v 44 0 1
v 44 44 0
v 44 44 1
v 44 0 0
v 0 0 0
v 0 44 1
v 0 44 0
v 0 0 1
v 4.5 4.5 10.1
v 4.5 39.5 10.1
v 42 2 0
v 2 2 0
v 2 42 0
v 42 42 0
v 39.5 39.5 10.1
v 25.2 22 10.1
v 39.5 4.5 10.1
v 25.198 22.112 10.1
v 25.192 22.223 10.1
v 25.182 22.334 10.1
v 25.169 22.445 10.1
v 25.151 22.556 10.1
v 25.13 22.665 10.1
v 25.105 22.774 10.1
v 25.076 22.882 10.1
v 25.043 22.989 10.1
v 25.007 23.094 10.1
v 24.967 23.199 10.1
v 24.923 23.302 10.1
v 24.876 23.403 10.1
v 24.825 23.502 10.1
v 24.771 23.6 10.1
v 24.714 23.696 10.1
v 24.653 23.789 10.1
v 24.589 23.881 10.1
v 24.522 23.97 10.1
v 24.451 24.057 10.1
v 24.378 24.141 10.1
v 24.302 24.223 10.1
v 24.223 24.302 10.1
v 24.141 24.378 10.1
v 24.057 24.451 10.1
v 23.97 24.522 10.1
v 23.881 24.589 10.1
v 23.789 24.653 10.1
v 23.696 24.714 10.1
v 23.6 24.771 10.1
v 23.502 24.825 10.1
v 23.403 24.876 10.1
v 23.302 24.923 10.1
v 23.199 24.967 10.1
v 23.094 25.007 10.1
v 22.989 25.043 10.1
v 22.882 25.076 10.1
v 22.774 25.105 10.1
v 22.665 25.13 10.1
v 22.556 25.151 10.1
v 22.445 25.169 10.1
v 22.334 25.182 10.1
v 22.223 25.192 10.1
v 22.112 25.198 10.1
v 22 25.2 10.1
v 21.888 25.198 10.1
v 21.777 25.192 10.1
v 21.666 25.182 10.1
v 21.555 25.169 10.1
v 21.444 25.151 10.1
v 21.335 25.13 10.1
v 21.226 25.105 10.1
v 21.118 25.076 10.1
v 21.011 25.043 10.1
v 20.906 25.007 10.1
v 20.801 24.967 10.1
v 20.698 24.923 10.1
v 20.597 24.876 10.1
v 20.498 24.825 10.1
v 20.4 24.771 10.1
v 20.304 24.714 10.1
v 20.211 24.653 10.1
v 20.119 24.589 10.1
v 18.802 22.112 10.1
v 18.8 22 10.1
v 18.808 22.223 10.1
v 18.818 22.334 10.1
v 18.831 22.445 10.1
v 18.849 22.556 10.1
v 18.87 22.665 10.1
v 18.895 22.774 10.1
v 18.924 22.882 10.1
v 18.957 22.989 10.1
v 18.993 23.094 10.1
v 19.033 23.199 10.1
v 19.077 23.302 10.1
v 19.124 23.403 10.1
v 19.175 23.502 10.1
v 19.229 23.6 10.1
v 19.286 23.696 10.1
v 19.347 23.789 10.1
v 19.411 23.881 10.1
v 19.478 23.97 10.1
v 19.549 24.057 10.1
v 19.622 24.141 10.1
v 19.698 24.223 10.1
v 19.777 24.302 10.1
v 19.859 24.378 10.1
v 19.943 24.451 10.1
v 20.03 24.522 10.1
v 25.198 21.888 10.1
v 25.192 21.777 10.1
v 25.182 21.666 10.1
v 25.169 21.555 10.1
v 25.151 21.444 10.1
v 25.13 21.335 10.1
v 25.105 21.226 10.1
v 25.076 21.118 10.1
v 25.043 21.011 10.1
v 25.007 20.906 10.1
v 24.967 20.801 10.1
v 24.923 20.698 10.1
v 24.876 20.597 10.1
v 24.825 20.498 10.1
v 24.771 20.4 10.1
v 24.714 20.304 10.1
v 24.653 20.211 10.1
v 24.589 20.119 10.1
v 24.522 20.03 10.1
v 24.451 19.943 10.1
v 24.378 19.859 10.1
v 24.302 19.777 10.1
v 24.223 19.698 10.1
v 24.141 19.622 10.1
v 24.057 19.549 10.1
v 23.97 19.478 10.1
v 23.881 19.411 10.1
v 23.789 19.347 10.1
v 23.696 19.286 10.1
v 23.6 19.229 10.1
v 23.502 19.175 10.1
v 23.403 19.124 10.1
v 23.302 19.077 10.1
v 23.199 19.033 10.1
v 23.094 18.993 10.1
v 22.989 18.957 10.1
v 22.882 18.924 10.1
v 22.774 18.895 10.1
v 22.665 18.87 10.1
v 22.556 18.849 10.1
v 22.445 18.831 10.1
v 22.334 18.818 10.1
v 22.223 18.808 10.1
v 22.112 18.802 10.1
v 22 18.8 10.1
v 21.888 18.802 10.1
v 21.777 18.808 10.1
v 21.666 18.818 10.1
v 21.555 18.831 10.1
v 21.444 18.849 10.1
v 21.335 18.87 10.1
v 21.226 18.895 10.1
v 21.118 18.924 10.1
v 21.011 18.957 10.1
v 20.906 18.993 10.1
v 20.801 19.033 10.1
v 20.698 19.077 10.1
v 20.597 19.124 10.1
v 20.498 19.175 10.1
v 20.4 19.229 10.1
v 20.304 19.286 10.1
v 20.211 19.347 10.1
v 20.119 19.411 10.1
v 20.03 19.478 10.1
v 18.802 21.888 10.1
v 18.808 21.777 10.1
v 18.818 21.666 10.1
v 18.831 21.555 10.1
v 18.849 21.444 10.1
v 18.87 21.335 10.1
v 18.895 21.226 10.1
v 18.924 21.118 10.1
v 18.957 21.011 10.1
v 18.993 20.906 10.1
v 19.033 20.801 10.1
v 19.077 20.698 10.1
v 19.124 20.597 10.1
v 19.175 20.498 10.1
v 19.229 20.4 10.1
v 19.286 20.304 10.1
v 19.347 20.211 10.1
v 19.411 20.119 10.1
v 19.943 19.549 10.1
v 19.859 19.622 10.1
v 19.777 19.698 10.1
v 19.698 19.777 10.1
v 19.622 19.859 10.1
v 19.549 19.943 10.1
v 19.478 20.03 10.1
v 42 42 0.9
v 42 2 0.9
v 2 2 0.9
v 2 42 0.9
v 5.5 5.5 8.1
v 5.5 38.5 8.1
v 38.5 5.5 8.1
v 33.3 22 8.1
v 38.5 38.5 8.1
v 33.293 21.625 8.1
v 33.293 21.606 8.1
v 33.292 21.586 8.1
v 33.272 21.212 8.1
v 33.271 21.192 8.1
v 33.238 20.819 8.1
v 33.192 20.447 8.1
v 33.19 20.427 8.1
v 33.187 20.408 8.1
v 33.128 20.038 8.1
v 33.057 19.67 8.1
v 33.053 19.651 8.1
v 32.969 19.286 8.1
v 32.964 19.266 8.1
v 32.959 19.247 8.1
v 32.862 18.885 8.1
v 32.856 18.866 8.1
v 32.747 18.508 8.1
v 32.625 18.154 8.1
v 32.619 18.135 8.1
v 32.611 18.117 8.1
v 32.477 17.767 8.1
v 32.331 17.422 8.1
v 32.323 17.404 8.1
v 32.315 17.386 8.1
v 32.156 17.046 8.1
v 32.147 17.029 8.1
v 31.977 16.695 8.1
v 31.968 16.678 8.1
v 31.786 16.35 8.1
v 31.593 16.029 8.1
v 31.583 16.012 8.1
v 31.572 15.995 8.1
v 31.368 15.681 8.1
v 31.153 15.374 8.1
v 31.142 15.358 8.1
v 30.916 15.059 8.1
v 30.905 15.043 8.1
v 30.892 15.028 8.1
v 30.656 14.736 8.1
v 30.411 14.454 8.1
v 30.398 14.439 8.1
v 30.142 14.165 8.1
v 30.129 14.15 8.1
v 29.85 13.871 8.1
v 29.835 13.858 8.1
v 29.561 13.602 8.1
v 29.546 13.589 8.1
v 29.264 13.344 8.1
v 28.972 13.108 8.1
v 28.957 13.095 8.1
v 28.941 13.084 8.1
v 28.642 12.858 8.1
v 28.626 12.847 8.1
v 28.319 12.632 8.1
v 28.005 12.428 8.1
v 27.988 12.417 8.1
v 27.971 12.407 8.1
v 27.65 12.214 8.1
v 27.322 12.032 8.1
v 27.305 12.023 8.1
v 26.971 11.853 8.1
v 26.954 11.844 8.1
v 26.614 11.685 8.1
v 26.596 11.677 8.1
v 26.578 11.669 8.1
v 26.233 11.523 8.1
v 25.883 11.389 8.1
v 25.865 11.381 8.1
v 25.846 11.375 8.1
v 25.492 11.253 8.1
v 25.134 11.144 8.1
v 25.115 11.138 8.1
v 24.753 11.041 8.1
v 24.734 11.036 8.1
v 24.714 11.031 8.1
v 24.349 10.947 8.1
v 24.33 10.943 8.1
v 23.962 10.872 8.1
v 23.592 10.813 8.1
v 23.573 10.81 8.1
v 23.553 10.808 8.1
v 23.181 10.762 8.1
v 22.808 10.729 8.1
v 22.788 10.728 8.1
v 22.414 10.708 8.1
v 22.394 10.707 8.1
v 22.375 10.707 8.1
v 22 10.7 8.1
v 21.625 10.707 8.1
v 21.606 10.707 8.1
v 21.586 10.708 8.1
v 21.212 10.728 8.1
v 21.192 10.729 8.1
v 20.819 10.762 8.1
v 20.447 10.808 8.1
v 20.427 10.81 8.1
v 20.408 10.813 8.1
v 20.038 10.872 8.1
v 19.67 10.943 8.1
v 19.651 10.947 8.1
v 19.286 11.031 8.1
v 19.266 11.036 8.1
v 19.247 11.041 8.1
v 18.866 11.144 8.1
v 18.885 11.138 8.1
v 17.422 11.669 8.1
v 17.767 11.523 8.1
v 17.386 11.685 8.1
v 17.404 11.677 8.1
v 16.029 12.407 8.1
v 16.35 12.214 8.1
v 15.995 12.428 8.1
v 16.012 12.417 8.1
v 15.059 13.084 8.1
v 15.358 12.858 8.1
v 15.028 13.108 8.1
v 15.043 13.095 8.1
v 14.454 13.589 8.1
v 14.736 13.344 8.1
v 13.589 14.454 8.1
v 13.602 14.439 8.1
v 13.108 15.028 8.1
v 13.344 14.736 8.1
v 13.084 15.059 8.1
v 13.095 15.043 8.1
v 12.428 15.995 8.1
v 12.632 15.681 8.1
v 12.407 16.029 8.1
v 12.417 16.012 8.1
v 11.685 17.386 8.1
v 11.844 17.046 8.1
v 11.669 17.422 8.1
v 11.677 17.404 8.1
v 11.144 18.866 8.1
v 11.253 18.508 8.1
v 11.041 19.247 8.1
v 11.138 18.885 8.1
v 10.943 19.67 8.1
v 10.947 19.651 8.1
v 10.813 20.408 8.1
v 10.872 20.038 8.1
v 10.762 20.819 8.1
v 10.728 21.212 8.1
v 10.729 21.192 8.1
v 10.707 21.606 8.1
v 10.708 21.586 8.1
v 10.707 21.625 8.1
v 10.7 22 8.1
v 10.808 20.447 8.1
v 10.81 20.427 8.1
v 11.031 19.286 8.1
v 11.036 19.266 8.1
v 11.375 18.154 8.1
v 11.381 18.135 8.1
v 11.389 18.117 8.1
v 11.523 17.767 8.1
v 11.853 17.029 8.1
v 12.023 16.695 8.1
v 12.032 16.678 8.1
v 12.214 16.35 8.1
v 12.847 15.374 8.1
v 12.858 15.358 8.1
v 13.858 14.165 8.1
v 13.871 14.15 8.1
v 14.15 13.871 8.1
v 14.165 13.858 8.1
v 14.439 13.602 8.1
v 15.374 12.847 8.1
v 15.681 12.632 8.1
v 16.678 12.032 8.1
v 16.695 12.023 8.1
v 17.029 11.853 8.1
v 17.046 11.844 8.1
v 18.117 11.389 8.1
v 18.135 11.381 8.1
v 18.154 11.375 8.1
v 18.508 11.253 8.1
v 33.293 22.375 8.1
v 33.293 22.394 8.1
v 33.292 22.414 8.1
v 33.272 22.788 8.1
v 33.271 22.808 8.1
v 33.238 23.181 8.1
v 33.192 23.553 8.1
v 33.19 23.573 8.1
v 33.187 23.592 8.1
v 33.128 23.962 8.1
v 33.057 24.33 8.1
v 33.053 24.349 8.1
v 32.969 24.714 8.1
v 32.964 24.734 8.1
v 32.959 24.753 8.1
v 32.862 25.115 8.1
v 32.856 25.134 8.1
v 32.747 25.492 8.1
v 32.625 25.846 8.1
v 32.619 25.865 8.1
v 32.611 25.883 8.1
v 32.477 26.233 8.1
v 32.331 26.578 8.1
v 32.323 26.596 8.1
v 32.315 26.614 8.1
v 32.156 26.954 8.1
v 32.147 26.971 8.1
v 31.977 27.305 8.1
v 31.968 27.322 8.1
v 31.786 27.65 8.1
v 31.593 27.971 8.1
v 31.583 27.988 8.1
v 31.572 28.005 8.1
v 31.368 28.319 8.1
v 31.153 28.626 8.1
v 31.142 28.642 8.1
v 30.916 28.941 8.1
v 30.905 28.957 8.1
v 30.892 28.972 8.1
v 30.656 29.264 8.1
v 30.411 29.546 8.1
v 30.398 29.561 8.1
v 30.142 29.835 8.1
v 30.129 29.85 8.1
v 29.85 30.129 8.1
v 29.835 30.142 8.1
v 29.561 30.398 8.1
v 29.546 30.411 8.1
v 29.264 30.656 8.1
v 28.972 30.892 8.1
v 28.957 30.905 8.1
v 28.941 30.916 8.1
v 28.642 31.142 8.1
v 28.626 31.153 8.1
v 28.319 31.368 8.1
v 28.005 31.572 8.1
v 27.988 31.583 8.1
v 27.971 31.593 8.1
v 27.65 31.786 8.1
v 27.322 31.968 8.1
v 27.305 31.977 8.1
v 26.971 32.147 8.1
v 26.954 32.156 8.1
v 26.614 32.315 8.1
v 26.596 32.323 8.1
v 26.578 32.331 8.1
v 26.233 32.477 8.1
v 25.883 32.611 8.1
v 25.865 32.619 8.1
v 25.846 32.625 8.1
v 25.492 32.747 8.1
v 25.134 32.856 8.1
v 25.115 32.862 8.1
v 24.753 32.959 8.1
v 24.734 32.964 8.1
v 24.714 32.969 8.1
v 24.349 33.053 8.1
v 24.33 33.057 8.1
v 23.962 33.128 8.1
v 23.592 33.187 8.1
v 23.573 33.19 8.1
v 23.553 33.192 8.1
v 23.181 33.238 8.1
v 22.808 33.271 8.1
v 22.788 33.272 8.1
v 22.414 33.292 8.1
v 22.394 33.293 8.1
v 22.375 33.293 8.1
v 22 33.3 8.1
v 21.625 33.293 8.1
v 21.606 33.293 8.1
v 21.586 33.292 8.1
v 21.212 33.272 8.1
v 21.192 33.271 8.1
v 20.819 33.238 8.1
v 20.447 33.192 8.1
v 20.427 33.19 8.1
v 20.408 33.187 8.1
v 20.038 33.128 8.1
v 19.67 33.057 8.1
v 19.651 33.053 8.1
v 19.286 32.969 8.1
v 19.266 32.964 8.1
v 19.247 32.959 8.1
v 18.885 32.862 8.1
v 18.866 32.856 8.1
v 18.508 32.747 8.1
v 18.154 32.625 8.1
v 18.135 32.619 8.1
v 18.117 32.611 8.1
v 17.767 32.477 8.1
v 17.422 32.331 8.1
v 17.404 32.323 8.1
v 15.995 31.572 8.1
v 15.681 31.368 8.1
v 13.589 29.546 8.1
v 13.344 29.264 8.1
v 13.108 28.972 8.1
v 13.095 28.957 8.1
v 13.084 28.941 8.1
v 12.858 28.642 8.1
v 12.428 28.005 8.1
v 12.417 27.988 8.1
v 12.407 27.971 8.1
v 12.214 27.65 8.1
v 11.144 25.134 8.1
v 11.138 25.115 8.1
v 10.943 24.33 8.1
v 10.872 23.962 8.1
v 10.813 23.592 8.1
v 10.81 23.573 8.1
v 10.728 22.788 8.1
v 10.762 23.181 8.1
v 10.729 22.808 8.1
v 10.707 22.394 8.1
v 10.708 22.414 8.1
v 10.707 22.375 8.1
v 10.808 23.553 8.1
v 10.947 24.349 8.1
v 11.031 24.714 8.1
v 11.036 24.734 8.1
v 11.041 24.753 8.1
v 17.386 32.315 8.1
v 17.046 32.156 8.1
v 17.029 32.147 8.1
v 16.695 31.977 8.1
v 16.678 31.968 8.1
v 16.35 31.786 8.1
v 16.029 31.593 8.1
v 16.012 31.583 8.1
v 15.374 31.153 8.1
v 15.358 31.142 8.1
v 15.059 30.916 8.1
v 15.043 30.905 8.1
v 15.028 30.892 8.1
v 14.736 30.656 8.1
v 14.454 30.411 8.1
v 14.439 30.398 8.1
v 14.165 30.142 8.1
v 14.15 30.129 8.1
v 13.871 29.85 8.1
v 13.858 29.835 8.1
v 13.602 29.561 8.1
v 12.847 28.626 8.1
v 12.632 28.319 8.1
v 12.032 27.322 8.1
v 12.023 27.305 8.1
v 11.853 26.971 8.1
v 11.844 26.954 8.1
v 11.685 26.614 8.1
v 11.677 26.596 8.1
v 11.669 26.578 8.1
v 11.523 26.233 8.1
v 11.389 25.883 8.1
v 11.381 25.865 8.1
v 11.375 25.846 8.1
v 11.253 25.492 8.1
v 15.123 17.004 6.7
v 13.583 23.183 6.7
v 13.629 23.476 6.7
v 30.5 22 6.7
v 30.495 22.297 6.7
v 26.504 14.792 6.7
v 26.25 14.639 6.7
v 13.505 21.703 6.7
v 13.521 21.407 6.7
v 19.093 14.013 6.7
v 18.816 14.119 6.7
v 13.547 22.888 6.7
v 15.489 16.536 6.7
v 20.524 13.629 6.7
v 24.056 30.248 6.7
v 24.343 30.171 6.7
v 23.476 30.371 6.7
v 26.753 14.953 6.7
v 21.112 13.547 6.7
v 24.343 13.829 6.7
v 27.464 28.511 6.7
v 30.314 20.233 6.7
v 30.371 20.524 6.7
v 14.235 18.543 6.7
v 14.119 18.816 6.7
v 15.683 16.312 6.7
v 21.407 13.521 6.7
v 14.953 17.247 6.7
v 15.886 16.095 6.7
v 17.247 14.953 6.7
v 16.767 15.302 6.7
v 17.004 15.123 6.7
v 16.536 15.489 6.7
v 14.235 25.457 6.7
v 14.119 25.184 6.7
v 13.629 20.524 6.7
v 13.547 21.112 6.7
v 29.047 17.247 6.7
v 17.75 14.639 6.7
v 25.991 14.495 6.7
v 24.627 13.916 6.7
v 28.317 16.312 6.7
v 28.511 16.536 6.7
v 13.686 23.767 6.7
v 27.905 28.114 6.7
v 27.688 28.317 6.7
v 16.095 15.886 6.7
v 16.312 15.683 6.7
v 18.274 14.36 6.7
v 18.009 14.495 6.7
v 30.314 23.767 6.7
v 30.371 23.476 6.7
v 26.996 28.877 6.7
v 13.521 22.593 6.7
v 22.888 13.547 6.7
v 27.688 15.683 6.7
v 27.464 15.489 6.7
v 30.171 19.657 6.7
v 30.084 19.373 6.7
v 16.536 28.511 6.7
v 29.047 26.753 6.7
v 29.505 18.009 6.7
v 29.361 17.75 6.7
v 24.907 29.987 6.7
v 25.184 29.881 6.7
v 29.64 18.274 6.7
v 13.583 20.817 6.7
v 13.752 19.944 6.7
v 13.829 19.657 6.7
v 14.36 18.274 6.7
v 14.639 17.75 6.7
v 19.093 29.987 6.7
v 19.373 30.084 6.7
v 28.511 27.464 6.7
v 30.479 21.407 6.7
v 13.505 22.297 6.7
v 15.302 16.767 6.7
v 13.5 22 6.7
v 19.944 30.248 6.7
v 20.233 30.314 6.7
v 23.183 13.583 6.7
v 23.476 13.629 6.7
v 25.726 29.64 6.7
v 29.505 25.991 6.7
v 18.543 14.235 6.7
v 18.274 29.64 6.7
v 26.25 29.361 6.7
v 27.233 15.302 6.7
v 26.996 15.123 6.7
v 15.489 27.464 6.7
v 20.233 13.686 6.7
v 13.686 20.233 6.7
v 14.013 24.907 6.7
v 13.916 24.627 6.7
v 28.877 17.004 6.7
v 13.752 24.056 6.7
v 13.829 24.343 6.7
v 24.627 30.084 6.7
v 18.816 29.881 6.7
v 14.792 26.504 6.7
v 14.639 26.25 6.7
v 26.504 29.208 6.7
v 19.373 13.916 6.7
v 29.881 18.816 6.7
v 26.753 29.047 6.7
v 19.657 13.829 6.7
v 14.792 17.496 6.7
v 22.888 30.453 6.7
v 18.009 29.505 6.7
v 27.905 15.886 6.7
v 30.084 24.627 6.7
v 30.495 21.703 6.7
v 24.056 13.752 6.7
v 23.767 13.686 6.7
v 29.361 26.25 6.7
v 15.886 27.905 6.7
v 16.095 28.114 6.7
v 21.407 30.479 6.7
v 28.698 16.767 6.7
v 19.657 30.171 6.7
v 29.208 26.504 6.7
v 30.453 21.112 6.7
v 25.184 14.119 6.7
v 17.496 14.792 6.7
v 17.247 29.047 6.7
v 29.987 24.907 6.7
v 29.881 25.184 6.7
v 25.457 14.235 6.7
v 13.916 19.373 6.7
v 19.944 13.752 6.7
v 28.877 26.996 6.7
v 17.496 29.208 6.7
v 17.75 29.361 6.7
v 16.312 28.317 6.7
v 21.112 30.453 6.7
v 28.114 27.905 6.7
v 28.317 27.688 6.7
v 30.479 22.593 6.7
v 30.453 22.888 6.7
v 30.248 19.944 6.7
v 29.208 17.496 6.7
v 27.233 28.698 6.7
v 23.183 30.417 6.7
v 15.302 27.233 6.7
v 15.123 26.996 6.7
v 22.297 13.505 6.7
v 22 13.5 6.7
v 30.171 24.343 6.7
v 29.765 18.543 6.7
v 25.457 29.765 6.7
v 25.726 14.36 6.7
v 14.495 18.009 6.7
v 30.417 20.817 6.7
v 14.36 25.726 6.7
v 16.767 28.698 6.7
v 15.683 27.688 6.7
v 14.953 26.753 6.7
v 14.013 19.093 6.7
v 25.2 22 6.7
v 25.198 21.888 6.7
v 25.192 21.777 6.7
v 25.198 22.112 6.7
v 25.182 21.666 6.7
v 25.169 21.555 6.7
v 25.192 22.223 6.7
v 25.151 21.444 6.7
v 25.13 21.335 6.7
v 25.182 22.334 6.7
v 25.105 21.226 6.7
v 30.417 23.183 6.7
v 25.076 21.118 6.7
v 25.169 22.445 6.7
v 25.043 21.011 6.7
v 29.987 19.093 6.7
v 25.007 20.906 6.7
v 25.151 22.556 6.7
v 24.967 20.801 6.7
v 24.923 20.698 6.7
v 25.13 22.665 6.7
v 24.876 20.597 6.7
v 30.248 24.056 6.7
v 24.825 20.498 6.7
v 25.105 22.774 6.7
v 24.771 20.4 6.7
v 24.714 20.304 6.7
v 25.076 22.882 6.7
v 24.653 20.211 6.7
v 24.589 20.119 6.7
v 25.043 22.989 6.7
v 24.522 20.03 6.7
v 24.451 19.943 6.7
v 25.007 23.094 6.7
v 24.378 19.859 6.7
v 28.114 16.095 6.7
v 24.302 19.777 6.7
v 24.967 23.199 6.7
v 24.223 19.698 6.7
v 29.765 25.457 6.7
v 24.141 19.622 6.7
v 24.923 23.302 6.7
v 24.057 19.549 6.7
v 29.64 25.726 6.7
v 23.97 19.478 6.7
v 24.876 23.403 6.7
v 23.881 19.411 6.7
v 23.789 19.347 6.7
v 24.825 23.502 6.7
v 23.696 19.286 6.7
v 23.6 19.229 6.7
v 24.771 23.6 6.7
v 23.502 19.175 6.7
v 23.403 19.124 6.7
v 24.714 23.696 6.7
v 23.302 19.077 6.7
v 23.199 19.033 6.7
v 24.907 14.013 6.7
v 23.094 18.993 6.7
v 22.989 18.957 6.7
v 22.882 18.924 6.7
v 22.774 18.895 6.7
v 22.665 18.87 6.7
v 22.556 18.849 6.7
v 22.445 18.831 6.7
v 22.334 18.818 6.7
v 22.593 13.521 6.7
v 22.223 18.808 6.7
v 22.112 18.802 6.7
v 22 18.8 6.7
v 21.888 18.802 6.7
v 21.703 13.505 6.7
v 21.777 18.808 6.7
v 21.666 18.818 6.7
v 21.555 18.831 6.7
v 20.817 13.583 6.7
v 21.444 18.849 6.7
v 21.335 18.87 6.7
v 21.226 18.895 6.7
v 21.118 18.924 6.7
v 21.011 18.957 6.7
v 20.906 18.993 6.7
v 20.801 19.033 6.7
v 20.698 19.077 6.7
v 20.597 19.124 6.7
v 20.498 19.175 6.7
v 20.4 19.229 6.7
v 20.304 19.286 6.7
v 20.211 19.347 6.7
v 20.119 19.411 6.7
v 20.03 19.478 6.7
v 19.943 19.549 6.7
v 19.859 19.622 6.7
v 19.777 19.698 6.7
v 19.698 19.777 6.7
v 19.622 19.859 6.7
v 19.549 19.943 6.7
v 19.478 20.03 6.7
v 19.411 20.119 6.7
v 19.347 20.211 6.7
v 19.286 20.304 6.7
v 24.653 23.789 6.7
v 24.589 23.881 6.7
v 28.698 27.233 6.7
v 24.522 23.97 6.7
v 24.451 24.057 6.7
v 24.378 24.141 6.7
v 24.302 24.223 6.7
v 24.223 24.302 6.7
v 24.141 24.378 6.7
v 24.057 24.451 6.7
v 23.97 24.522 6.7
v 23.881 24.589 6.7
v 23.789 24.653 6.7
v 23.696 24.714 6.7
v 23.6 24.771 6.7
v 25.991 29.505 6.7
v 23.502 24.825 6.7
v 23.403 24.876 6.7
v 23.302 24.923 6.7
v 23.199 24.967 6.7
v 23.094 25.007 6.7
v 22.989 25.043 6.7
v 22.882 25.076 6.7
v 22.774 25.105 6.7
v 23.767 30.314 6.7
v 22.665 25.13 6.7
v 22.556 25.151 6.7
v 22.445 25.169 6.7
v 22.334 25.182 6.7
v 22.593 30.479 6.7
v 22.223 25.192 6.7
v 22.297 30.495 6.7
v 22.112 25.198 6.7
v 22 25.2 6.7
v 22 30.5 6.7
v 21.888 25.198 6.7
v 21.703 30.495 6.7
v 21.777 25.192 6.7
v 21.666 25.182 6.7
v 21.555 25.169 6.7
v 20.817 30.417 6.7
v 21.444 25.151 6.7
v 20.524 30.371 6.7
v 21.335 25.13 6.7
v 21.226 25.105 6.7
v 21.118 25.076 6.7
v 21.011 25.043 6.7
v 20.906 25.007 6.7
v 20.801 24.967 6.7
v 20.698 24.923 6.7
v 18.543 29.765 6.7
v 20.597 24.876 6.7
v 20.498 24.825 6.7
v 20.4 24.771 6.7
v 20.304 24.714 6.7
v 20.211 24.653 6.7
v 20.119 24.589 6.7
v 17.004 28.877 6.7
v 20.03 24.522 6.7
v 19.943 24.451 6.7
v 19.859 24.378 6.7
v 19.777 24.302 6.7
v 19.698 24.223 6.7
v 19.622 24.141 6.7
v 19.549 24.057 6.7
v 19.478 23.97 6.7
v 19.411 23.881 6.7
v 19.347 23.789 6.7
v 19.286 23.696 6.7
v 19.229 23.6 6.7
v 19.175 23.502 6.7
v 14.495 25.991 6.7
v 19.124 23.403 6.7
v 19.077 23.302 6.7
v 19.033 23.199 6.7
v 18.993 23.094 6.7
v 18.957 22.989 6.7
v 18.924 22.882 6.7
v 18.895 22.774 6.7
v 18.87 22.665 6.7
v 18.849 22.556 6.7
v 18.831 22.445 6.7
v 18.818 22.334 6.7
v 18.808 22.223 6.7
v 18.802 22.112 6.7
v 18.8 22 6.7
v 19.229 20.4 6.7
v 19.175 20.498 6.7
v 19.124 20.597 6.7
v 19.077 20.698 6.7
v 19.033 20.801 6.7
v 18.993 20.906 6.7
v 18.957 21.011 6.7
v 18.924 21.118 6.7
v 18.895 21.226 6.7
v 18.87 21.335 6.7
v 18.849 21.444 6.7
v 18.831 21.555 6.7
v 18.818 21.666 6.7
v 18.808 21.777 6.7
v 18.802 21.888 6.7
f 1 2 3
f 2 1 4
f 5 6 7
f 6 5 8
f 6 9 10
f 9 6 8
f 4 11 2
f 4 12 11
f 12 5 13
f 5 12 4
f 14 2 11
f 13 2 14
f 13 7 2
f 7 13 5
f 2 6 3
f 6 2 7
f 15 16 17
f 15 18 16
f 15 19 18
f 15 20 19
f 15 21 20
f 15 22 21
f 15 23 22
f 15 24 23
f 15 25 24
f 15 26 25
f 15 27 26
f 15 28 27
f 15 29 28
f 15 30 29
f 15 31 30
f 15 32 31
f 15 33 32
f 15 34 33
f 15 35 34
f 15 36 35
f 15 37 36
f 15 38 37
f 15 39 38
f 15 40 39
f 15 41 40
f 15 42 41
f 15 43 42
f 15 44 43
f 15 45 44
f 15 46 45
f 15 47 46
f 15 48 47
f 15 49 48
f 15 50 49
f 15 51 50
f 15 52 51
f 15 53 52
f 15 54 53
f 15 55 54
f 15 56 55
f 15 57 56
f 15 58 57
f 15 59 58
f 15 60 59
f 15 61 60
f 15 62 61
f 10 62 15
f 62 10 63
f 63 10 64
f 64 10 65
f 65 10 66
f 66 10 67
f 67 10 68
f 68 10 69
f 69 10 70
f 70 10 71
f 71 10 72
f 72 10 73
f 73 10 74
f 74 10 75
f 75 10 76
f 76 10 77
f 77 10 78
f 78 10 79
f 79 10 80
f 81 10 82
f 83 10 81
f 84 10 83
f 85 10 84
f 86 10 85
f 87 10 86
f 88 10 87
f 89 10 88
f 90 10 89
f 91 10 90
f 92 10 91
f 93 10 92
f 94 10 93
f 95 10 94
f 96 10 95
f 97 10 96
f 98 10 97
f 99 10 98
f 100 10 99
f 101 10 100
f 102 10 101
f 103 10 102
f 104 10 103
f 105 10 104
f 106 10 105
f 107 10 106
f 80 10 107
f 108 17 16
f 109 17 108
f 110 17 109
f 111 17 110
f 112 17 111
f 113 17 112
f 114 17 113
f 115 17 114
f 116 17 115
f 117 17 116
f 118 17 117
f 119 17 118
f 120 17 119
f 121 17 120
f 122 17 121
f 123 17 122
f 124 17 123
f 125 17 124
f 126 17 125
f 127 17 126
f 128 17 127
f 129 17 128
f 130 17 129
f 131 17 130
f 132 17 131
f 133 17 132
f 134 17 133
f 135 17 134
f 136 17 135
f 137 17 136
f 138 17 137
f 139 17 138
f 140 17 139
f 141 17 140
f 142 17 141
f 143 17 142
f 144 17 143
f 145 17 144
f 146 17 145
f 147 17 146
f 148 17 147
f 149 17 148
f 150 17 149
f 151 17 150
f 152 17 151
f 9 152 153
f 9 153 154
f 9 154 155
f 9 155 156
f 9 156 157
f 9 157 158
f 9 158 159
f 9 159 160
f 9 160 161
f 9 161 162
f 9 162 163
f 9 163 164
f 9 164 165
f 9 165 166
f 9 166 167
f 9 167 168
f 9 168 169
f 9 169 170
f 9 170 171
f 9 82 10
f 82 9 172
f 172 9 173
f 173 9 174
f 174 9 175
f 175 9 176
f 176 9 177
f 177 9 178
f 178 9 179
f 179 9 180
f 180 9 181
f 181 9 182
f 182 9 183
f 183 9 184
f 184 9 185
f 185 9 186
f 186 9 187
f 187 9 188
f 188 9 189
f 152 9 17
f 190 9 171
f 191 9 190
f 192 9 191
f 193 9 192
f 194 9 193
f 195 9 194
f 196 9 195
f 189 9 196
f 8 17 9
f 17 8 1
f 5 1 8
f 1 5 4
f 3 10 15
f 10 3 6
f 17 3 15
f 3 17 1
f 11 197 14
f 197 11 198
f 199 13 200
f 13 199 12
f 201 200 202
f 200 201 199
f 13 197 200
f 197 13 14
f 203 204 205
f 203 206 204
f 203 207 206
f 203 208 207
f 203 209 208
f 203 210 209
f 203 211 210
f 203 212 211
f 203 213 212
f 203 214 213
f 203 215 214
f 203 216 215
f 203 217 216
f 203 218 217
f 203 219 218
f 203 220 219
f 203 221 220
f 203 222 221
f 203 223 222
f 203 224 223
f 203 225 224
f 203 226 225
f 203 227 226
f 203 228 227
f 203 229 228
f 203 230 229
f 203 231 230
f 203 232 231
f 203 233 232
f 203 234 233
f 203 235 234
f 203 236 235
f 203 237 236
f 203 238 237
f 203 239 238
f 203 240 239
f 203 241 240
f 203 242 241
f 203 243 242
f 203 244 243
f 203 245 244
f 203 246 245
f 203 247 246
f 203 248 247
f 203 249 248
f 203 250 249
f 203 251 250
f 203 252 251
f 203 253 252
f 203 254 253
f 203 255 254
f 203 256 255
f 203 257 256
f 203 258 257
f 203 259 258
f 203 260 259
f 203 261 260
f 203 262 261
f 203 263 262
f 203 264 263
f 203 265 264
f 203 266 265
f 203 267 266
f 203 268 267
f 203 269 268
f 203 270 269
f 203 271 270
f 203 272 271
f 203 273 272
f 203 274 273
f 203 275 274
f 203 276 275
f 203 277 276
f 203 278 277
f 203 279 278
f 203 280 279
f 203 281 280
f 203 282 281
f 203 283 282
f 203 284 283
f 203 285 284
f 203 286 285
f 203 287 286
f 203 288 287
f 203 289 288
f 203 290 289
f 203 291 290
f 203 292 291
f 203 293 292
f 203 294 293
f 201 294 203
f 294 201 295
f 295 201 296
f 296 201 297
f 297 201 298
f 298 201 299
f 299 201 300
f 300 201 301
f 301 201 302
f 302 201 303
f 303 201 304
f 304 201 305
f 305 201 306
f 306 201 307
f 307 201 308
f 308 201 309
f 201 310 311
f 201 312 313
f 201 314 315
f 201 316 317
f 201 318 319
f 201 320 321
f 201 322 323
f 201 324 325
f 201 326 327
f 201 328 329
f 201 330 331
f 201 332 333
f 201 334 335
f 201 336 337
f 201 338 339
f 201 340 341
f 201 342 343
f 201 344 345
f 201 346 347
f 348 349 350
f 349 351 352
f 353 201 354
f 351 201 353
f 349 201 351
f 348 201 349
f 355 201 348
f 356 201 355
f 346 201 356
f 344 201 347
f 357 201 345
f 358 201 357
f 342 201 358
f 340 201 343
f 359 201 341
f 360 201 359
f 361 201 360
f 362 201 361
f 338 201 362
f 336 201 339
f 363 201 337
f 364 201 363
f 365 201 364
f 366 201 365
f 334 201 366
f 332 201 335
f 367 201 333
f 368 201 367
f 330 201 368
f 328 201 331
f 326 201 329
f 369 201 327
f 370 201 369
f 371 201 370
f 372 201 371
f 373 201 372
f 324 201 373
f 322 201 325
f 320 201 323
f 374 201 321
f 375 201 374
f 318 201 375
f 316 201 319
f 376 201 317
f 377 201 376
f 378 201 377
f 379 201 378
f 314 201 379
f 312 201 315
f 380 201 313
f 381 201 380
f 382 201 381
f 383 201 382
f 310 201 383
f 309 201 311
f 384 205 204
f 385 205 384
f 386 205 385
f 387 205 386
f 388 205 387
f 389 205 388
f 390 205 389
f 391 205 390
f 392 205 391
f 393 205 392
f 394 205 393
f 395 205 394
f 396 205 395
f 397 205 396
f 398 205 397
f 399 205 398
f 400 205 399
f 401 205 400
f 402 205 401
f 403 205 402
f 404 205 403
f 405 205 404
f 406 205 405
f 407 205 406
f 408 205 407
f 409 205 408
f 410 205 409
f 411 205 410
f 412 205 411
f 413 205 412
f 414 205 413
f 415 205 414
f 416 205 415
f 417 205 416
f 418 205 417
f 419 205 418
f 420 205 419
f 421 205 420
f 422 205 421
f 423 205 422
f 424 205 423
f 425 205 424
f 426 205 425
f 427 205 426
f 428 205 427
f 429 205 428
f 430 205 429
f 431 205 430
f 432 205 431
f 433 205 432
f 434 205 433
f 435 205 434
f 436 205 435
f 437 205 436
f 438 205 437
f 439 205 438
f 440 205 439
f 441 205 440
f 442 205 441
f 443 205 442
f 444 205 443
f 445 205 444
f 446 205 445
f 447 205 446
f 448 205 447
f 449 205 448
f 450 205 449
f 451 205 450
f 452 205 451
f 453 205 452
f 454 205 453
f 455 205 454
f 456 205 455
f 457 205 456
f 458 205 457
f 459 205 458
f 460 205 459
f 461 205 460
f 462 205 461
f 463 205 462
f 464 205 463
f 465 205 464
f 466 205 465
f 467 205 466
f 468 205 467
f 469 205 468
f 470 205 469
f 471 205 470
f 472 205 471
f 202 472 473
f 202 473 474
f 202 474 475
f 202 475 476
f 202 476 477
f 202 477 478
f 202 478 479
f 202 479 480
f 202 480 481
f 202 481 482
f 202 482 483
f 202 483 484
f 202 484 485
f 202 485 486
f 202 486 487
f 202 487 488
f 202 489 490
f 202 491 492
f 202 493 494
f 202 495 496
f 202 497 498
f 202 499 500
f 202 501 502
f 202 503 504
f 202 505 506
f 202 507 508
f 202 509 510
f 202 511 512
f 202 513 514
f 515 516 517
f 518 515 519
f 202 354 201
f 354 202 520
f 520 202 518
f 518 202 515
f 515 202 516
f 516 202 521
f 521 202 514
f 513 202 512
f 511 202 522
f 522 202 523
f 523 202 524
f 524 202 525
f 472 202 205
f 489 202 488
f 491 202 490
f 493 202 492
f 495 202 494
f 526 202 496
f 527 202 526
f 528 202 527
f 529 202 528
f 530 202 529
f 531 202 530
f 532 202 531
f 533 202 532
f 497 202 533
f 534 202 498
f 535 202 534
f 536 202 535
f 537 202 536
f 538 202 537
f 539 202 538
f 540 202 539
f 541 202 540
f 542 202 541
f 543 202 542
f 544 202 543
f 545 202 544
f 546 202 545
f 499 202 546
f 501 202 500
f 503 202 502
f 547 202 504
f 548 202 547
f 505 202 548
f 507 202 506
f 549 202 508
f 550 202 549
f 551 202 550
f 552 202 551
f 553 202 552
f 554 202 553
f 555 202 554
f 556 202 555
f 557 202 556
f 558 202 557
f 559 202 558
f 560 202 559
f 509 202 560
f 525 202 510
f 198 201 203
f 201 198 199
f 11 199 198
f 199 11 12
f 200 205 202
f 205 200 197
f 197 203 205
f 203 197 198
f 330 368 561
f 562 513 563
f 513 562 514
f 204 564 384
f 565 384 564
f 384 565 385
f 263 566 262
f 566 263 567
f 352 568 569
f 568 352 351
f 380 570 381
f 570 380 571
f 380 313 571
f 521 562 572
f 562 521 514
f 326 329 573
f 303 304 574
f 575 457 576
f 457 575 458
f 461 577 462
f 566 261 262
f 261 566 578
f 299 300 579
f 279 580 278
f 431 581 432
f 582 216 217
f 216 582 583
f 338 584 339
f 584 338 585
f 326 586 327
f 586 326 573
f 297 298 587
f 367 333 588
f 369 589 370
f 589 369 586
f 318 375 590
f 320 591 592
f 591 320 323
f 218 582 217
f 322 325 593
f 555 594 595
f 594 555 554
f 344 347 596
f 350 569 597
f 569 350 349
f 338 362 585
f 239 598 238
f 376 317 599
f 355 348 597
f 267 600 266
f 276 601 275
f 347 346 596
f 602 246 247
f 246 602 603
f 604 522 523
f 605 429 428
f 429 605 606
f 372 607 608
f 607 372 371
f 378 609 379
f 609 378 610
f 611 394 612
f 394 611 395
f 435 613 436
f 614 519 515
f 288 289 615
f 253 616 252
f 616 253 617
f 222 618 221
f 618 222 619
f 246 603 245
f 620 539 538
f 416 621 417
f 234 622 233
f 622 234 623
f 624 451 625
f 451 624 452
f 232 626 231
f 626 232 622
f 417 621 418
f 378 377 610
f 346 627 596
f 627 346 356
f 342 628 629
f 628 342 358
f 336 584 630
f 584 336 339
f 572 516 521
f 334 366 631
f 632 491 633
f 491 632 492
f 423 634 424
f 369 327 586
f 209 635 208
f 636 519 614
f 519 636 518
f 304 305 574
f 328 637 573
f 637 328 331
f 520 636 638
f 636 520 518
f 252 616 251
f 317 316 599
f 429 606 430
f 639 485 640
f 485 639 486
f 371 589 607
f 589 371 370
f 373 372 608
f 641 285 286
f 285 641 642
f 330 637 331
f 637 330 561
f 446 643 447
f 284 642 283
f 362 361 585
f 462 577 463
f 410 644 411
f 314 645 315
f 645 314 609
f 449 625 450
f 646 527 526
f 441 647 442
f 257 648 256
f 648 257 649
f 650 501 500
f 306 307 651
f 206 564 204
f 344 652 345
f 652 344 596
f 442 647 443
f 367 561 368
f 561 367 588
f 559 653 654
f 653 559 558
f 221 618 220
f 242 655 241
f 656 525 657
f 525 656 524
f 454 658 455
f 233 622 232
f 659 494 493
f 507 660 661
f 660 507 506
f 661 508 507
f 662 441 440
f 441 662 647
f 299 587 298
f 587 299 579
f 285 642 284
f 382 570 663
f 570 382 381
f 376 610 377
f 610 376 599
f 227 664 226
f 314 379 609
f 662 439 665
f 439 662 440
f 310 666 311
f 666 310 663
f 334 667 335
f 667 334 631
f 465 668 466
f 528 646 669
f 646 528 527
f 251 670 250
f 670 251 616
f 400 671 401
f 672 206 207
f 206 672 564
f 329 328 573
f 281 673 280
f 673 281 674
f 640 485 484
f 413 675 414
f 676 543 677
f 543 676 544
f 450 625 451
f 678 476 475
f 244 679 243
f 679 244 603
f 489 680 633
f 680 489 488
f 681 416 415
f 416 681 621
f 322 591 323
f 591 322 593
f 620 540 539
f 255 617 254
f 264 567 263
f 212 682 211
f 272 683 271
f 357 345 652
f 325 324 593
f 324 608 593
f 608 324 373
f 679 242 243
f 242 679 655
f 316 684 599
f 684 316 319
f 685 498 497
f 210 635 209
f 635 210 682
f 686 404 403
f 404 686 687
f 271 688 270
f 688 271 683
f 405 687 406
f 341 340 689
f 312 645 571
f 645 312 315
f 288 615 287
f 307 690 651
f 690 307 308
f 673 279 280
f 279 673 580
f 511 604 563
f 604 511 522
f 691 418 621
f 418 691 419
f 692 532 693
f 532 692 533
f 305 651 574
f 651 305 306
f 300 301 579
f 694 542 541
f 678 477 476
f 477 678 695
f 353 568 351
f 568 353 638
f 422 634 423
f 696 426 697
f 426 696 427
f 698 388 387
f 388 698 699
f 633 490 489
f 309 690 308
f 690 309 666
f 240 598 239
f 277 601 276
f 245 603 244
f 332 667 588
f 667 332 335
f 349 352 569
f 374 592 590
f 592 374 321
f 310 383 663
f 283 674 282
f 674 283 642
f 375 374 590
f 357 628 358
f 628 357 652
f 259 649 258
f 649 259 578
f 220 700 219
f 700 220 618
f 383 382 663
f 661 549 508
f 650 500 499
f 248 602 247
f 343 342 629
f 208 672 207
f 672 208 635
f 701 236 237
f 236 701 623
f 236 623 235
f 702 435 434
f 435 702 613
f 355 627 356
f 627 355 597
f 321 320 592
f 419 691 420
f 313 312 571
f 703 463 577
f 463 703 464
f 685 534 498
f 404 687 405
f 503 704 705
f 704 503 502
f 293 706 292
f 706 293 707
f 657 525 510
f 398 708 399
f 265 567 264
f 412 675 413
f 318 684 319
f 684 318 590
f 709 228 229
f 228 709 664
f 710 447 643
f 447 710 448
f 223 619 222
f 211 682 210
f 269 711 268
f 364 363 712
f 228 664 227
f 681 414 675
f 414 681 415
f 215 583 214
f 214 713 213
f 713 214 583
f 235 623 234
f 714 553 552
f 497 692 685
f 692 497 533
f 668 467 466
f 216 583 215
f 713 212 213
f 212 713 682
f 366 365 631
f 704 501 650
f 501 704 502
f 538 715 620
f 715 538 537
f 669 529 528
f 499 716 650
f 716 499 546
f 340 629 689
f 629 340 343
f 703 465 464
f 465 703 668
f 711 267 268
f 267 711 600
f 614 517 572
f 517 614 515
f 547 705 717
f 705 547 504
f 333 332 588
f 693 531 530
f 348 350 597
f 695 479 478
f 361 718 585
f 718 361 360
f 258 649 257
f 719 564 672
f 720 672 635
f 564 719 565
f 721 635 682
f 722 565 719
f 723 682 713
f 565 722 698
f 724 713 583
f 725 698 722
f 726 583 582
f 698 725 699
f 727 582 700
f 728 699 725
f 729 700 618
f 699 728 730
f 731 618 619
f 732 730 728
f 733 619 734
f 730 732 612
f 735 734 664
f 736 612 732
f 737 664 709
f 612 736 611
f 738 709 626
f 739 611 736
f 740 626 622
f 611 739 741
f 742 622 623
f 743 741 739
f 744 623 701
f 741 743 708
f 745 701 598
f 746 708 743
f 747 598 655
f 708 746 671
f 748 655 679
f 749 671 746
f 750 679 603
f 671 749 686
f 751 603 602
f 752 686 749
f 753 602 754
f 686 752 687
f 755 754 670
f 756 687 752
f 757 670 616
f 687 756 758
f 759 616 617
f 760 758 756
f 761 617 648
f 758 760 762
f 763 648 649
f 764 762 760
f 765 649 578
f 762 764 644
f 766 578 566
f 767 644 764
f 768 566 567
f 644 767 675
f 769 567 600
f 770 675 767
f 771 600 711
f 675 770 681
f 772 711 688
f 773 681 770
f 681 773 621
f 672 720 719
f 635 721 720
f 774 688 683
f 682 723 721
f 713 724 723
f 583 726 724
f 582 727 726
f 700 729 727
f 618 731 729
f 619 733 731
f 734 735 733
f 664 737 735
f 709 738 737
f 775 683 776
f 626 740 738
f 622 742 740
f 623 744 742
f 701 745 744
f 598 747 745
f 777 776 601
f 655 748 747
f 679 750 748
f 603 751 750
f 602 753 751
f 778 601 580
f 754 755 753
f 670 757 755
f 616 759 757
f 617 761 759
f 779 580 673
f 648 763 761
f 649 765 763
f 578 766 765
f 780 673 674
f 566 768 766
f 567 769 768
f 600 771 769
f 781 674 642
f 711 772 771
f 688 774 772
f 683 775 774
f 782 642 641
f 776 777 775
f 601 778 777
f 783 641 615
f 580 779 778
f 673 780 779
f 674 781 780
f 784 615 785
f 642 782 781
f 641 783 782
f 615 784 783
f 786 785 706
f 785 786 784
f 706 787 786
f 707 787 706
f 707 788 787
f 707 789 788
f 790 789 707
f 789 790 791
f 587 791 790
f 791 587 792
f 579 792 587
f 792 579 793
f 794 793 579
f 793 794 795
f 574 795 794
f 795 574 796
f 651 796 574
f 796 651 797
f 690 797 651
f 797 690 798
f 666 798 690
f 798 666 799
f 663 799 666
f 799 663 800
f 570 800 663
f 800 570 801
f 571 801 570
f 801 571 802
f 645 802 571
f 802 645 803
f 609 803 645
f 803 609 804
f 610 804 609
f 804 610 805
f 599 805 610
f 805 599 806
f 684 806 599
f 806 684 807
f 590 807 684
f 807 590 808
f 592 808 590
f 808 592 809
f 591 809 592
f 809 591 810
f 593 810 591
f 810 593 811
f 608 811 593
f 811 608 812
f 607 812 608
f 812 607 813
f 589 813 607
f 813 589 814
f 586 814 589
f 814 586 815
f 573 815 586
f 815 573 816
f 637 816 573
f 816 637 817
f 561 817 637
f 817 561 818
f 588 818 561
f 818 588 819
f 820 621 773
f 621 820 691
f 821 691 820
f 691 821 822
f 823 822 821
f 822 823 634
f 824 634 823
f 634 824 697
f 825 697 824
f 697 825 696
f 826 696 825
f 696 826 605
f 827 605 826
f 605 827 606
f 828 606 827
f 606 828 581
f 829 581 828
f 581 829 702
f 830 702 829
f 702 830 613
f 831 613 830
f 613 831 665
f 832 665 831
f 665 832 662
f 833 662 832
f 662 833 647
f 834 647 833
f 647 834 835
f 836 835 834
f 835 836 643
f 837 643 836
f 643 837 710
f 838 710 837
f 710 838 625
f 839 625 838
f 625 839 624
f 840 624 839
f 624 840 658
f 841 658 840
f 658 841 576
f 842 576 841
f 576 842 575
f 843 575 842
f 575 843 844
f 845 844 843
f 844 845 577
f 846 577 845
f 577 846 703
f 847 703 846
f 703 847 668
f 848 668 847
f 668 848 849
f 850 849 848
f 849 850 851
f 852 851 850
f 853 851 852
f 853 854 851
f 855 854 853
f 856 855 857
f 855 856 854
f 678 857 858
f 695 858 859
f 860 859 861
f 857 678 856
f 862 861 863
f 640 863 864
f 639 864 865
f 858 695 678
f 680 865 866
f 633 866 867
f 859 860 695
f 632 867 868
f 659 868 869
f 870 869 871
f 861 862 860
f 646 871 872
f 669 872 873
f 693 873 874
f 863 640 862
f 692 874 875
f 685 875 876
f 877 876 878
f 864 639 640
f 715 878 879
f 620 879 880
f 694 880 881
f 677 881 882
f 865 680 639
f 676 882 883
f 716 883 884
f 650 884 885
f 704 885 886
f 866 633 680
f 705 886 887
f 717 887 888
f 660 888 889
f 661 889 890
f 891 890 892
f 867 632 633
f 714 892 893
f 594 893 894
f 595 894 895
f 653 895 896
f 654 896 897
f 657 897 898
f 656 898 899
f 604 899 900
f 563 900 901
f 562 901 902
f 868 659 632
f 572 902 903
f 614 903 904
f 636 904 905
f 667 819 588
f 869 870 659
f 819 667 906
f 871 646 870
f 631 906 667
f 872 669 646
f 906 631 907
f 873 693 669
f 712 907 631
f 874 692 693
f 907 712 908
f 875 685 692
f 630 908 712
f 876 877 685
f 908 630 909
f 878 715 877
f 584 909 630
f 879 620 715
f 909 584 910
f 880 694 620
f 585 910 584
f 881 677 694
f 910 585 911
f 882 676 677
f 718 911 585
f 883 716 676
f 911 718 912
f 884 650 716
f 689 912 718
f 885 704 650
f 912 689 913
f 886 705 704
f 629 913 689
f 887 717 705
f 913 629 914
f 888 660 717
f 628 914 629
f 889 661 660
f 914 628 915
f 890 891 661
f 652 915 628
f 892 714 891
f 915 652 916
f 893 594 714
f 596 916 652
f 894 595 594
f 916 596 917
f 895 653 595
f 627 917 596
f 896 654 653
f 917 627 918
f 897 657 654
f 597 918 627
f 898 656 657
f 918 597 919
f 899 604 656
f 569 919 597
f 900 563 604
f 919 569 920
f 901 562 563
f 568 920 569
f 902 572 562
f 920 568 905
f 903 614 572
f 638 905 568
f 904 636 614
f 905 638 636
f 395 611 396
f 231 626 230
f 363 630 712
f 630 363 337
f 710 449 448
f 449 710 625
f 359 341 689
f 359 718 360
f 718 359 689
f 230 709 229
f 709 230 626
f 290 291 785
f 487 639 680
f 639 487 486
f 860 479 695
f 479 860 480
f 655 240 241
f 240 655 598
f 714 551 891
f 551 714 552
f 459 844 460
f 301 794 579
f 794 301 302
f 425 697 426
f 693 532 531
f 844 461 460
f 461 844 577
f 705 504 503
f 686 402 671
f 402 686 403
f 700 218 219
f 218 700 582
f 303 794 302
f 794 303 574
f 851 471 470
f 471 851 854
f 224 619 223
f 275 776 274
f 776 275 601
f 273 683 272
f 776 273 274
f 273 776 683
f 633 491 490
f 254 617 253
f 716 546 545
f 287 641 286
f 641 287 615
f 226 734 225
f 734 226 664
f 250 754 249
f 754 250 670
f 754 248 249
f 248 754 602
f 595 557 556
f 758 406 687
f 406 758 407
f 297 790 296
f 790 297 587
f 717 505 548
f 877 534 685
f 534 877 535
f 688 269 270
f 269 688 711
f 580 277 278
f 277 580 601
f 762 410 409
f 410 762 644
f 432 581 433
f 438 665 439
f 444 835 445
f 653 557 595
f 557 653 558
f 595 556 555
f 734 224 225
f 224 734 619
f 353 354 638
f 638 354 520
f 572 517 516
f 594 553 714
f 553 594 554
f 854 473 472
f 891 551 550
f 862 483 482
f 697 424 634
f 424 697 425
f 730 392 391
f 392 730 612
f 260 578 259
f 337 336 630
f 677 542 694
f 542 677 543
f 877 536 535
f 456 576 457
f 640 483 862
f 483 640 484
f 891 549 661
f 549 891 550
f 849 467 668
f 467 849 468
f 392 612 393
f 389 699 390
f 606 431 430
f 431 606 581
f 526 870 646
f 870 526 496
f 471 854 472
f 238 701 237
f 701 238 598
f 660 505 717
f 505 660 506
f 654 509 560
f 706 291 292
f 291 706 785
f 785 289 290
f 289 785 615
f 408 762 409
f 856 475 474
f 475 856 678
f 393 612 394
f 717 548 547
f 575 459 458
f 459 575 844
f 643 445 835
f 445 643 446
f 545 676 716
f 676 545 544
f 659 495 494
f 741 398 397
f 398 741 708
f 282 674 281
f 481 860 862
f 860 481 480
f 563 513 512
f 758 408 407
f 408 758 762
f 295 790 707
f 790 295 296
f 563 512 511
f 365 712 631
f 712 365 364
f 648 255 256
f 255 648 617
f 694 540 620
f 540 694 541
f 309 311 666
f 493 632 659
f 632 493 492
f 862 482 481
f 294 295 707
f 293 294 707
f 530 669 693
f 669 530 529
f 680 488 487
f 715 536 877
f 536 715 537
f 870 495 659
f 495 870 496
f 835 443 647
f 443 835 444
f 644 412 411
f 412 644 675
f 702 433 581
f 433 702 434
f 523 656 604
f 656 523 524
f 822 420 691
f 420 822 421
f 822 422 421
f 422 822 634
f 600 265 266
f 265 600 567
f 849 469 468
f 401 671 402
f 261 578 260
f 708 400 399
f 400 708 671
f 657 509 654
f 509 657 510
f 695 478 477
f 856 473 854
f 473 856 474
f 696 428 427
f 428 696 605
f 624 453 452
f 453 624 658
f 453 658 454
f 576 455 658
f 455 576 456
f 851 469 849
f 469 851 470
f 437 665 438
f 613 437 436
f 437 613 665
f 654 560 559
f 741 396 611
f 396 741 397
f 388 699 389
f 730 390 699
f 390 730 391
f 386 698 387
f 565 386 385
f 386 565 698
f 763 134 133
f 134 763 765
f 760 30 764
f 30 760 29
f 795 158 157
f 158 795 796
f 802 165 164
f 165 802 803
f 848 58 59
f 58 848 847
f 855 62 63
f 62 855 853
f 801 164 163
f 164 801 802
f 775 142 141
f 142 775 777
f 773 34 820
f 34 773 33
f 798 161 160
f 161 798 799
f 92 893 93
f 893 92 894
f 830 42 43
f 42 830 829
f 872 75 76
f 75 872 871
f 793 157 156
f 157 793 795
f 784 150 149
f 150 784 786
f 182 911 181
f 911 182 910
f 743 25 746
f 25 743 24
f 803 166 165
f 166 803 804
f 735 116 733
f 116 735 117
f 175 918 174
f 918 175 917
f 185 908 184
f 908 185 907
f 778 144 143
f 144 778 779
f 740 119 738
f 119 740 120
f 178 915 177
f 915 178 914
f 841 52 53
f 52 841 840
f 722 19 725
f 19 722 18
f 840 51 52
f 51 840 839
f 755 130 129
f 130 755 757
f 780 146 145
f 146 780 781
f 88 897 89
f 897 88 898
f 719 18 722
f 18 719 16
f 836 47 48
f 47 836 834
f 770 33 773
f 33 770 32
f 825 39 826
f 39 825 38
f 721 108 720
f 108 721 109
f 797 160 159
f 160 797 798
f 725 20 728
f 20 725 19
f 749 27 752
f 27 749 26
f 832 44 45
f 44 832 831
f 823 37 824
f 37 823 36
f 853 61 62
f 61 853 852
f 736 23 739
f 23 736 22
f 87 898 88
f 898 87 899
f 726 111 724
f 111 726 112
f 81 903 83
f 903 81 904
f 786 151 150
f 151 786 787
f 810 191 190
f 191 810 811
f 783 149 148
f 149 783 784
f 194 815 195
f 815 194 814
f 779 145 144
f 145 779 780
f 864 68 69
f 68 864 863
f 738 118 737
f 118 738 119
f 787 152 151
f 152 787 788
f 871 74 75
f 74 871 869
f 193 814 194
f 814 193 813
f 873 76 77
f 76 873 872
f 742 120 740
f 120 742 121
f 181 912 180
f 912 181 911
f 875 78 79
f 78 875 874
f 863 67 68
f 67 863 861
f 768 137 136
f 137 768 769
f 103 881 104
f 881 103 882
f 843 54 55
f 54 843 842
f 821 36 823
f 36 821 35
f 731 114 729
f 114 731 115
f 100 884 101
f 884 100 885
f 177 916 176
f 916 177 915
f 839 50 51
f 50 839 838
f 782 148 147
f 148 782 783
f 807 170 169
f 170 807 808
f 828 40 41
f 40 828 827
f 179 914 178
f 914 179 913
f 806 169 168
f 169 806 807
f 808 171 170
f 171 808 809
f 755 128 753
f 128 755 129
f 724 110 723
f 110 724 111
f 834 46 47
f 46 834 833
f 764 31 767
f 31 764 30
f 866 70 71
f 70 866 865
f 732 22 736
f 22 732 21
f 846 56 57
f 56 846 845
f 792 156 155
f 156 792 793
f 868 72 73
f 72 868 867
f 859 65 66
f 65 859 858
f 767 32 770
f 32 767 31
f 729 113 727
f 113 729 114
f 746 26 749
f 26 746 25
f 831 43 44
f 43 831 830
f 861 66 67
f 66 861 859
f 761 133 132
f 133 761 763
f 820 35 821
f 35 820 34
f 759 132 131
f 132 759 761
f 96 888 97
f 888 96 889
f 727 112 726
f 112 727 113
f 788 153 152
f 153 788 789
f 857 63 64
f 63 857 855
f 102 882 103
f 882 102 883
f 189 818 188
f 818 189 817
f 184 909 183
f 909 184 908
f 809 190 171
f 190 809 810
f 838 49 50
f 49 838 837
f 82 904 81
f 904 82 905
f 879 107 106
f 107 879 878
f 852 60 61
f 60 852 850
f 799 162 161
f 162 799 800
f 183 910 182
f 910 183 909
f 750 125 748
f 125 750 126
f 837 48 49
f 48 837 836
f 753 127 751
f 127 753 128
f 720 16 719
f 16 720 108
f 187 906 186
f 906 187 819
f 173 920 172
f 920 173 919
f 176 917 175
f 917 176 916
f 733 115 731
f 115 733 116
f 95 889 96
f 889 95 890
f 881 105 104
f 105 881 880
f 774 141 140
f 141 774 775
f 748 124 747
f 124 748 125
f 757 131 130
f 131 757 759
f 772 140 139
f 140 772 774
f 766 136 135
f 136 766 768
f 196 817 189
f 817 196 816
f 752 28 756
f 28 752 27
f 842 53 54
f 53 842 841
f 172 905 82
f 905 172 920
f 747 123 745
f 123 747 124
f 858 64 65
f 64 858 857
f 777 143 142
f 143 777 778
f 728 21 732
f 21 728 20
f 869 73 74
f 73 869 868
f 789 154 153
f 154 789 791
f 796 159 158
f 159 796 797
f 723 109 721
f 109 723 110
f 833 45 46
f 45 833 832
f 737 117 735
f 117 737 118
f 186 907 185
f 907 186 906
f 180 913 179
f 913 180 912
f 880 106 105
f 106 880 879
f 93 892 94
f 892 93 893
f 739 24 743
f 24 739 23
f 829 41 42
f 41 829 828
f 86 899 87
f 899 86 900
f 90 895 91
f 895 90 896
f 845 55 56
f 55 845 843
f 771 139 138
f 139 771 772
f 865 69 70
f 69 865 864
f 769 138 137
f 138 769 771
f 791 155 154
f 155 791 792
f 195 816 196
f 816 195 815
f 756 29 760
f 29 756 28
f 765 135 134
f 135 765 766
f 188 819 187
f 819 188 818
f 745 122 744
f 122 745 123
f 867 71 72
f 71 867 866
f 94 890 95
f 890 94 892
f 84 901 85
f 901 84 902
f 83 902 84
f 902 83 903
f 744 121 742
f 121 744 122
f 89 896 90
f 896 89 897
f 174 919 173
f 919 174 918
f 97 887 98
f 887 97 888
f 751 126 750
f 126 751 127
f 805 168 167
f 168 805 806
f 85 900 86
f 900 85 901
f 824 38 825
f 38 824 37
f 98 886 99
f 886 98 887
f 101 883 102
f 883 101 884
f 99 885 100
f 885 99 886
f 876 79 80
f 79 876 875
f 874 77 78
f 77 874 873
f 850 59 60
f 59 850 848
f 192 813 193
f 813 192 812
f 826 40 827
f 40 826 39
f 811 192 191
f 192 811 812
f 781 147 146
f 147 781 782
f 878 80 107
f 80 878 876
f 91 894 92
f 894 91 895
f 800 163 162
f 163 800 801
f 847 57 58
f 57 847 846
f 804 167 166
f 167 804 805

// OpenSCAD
$fa=2;
$fs=.05;

bottom = 44;
top = 35;
depth = 10;
hole = 6.4;
pad_thickness = 3.5;

module quick_mount() {
    difference() {
        hull() {
            cube([bottom, bottom, 1]);
            offset = (bottom - top) / 2;
            translate([offset, offset, depth]) cube([top, top, .1]);
        }
        bot2 = bottom - 4;
        top2 = top - 2;
        hull() {
            translate([2, 2, -.1]) cube([bot2, bot2, 1]);
            offset = (bot2 - top2) / 2;
            translate([offset+2, offset+2, depth-2]) cube([top2, top2, .1]);
        }
   }
}

difference() {
    union() {
        quick_mount();
        translate([bottom/2, bottom/2, depth-pad_thickness+.2])
            cylinder(d=17, d2=23, h=pad_thickness-2);
    }
    translate([bottom/2, bottom/2, -.1]) {
        cylinder(d=hole, h=depth+2);
    }
}
